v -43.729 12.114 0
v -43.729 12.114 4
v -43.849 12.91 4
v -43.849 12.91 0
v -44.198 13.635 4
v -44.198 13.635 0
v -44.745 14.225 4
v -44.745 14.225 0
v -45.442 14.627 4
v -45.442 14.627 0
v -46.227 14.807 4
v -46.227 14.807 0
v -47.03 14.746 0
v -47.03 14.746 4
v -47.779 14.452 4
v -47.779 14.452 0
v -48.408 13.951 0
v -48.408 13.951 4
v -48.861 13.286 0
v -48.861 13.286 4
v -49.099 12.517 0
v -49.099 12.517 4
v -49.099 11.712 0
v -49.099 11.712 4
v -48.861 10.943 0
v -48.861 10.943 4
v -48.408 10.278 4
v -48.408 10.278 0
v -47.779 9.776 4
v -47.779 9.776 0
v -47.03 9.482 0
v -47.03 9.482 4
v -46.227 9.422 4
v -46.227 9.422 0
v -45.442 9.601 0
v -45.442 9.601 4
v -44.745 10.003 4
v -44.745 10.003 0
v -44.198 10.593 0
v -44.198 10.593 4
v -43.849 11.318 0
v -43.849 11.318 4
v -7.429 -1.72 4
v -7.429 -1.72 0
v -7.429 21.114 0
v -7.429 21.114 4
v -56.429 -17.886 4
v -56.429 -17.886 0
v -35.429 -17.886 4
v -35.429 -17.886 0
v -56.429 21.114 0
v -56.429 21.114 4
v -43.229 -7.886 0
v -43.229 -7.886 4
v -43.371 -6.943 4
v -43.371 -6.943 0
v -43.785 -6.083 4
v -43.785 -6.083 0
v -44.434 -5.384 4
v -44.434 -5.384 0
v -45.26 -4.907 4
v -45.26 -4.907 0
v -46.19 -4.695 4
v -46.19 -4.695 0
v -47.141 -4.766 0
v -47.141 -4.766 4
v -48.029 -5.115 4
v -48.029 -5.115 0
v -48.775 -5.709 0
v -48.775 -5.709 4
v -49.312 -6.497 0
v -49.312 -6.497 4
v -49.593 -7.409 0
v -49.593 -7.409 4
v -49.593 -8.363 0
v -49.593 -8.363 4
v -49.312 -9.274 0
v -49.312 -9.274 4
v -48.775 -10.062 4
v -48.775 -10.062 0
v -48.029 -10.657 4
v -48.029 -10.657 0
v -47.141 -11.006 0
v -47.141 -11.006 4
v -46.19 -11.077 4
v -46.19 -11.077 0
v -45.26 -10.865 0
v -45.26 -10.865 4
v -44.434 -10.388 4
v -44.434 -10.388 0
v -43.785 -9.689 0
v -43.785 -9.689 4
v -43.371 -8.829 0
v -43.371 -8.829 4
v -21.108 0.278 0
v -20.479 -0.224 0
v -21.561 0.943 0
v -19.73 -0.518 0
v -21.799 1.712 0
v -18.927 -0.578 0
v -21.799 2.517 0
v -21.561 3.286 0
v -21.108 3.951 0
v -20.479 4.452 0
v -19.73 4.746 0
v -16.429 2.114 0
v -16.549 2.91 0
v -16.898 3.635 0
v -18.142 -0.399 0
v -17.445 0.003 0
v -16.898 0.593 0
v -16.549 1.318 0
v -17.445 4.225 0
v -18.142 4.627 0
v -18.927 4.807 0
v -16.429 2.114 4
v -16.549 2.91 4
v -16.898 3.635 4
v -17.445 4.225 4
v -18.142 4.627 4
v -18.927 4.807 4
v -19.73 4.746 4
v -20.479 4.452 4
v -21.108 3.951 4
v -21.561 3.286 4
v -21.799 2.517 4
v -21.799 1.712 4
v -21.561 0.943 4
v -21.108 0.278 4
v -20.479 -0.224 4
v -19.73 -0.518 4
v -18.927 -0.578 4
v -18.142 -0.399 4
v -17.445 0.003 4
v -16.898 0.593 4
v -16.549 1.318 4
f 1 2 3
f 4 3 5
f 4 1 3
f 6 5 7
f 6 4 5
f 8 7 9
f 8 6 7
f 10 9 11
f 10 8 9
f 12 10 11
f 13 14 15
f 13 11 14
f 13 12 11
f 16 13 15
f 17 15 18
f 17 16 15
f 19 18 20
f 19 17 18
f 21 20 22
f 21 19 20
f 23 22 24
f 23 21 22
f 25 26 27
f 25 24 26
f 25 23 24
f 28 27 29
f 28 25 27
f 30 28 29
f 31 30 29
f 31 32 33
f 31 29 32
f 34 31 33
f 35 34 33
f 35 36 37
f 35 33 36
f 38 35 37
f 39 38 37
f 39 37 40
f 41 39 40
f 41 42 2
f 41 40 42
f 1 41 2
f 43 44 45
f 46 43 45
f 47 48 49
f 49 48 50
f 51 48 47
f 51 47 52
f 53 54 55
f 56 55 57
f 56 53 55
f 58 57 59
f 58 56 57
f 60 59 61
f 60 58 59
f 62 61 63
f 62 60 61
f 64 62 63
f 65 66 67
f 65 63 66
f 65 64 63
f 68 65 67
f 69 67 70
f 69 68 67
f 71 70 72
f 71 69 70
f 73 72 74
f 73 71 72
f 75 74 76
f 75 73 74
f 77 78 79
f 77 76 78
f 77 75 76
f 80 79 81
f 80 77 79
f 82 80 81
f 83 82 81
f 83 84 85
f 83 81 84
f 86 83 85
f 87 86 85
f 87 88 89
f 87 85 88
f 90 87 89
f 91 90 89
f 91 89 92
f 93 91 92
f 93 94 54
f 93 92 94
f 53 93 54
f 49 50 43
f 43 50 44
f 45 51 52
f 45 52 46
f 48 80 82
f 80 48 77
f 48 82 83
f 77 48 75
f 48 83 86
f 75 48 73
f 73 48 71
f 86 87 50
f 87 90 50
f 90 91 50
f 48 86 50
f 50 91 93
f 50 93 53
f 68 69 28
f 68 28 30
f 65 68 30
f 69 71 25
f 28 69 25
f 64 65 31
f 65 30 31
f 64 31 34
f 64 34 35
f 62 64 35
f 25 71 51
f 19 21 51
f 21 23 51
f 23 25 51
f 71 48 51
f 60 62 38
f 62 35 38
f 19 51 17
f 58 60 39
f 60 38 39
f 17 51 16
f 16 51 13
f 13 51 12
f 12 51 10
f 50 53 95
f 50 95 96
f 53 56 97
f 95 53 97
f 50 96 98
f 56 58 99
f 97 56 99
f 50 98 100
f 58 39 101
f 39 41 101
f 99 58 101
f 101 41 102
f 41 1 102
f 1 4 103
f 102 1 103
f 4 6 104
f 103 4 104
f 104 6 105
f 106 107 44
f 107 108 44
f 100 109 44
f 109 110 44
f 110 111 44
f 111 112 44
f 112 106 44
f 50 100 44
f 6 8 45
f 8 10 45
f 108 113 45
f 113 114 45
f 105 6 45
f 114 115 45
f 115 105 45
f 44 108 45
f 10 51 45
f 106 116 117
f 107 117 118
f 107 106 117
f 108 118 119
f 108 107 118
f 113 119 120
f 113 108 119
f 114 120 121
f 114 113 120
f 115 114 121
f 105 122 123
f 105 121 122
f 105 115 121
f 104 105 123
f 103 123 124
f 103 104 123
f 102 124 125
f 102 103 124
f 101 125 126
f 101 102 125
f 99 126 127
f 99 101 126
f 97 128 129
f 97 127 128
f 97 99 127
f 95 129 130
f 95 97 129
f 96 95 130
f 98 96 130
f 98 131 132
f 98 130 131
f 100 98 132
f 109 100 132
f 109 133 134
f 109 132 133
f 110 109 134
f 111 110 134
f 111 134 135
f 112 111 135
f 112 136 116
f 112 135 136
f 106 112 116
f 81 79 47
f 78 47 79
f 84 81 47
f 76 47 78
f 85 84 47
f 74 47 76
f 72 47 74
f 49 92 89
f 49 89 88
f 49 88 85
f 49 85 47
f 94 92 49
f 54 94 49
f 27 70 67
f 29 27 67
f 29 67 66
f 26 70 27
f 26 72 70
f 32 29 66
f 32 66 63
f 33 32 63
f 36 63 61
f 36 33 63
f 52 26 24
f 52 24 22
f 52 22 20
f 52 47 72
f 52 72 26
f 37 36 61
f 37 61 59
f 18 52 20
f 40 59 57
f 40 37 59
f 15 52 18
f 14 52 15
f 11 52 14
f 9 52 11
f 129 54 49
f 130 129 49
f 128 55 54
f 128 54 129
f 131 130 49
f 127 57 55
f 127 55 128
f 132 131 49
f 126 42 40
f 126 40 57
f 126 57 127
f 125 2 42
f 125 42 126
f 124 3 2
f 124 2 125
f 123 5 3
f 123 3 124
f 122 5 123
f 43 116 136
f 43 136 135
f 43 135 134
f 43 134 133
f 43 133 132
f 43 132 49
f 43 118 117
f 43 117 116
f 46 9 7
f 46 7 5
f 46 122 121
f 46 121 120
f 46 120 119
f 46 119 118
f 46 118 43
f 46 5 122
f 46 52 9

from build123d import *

# Parameters (mm, degrees)
SKETCH_1_W          = 49
SKETCH_1_H          = 39
EXTRUDE_1_DEPTH     = 4
CUT_EXTRUDE_1_DEPTH = 13
SKETCH_4_R          = 2.7
CUT_EXTRUDE_2_DEPTH = 17
SKETCH_5_R          = 2.7
SKETCH_5_R_2        = 3.2
CUT_EXTRUDE_3_DEPTH = 17


with BuildPart() as part:
    # 草图1 → 凸台-拉伸1 (new body)
    with BuildSketch(Plane.XY):
        with Locations((-31.928797257, 1.614086391)):
            Rectangle(SKETCH_1_W, SKETCH_1_H)
    extrude(amount=EXTRUDE_1_DEPTH)

    # 草图2 → 切除-拉伸1 (cut)
    with BuildSketch(Plane.XY):
        Polygon((-7.428797257, -17.885913609), (-35.428797257, -17.885913609), (5.926023005, 5.990303001), align=None)
    extrude(amount=CUT_EXTRUDE_1_DEPTH, mode=Mode.SUBTRACT)

    # 草图4 → 切除-拉伸2 (cut)
    with BuildSketch(Plane.XY):
        with Locations((-19.128797257, 2.114086391)):
            Circle(SKETCH_4_R)
    extrude(amount=CUT_EXTRUDE_2_DEPTH, mode=Mode.SUBTRACT)

    # 草图5 → 切除-拉伸3 (cut)
    with BuildSketch(Plane.XY):
        with Locations((-46.428797257, 12.114086391)):
            Circle(SKETCH_5_R)
        with Locations((-46.428797257, -7.885913609)):
            Circle(SKETCH_5_R_2)
    extrude(amount=CUT_EXTRUDE_3_DEPTH, mode=Mode.SUBTRACT)


solid = part.part
